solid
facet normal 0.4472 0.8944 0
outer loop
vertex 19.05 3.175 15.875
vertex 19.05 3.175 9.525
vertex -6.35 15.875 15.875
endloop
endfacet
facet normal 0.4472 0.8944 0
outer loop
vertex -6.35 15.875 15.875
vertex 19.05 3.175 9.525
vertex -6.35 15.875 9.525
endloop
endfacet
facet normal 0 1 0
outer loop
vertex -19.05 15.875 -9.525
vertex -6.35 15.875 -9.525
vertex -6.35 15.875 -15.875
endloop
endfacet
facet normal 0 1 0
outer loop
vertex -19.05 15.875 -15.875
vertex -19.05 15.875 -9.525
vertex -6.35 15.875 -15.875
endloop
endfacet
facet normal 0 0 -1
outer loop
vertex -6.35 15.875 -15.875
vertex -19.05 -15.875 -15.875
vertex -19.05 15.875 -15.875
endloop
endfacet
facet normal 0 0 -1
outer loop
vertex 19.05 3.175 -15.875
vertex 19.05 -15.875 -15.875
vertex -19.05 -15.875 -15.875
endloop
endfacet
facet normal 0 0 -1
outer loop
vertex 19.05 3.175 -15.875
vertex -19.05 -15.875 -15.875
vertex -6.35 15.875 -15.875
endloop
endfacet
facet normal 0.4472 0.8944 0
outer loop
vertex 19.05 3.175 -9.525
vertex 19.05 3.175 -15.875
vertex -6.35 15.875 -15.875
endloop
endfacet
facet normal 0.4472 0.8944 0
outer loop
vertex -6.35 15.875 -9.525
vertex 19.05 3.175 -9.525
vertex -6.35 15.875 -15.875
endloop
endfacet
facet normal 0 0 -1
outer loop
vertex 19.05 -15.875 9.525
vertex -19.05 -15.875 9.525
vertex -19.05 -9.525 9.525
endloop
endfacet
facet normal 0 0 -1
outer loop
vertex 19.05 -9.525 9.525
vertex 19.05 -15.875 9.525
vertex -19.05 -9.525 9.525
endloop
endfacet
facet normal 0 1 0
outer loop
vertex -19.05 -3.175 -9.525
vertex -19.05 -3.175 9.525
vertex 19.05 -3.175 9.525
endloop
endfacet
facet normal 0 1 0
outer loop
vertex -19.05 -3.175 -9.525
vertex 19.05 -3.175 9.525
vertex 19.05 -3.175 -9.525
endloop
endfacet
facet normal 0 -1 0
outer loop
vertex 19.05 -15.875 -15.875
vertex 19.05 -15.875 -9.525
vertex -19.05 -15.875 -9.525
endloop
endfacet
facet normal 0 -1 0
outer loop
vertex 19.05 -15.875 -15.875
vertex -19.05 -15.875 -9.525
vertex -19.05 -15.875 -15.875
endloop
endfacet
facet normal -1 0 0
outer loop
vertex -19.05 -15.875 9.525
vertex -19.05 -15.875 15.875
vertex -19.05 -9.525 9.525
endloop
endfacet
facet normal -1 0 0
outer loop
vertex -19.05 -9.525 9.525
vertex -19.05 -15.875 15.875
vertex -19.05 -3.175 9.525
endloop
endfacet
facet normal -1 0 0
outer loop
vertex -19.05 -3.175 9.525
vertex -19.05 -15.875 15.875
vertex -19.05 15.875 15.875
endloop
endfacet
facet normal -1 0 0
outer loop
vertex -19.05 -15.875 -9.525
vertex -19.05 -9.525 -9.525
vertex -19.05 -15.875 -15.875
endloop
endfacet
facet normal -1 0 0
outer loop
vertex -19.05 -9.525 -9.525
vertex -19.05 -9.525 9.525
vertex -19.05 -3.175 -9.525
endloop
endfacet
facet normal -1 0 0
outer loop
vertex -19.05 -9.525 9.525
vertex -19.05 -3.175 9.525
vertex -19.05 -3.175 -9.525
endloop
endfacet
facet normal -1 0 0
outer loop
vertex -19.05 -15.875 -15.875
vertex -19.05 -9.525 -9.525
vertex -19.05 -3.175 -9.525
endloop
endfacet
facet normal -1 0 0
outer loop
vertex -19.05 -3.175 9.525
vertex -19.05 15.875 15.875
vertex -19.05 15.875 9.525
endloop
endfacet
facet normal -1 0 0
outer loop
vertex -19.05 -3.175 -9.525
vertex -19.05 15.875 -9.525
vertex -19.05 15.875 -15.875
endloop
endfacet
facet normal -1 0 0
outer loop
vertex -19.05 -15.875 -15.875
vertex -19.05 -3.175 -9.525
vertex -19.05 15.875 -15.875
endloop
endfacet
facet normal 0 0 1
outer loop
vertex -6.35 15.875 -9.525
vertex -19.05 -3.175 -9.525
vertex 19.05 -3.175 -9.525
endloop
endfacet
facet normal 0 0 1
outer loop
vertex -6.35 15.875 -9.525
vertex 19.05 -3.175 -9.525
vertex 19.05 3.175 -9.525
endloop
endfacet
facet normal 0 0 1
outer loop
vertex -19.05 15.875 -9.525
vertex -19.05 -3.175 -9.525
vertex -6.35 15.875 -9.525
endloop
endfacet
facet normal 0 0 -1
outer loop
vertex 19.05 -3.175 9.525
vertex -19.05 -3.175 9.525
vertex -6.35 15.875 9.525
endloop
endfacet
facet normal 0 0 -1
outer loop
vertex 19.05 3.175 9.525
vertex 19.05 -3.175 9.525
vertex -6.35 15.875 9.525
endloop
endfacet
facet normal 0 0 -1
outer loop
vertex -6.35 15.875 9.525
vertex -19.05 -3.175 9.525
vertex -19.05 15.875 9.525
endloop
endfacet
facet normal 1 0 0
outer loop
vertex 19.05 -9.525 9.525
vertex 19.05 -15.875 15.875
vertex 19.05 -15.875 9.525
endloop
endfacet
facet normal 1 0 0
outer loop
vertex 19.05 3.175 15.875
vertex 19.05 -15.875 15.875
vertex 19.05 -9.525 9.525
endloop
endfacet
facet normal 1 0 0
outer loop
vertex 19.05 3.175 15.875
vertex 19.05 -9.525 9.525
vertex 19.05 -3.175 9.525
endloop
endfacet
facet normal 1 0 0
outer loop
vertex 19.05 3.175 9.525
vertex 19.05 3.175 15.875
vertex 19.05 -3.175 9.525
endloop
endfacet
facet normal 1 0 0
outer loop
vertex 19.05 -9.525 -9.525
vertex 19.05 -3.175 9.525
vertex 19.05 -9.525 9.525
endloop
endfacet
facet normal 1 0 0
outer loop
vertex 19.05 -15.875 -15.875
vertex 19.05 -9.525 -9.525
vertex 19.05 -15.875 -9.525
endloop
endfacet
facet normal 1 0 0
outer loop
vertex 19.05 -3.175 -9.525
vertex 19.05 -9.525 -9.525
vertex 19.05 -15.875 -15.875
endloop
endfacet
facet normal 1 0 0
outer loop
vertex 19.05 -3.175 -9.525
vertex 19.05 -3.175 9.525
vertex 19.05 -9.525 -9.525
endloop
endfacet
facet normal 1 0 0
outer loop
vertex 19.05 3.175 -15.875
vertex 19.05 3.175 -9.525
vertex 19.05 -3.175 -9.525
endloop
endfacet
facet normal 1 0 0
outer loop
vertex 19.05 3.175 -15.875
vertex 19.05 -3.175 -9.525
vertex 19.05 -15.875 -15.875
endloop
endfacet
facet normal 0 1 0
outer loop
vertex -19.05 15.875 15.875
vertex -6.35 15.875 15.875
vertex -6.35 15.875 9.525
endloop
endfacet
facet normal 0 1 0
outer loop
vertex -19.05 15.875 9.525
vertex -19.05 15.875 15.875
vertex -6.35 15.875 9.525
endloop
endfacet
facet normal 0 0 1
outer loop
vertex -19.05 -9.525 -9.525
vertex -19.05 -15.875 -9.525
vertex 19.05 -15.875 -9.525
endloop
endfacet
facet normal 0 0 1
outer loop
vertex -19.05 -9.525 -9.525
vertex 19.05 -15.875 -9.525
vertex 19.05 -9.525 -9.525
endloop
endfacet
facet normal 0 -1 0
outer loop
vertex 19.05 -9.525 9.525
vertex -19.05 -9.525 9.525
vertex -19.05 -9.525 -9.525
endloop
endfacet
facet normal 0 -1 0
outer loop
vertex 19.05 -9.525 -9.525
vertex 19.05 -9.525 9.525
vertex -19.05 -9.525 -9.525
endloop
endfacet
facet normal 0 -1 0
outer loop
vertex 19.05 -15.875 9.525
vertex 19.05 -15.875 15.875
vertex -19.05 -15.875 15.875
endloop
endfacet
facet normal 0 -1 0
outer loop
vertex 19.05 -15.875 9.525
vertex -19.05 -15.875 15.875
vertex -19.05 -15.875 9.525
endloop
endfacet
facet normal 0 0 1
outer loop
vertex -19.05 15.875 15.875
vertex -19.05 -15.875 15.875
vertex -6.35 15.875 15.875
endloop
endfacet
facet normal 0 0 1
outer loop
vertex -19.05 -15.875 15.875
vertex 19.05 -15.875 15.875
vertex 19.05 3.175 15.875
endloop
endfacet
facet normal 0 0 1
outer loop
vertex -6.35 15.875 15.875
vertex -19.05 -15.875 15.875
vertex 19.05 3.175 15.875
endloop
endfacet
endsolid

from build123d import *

# Parameters (mm, degrees)
SKETCH2_W               = 31.75
SKETCH2_H               = 31.75
BOSS_EXTRUDE2_DEPTH     = 19.05
CUT_EXTRUDE1_DEPTH      = 30.443738723
CUT_EXTRUDE1_DEPTH_BACK = 30.443738723
SKETCH4_W               = 19.05
SKETCH4_H               = 19.05
CUT_EXTRUDE2_DEPTH      = 30.443738723
CUT_EXTRUDE2_DEPTH_BACK = 30.443738723
SKETCH5_W               = 19.05
SKETCH5_H               = 6.35
CUT_EXTRUDE3_DEPTH      = 30.443738723
CUT_EXTRUDE3_DEPTH_BACK = 30.443738723


with BuildPart() as part:
    # Sketch2 → Boss-Extrude2 (new, symmetric)
    with BuildSketch(Plane(origin=(0, 0, 0), x_dir=(0, 0, -1), z_dir=(1, 0, 0))):
        Rectangle(SKETCH2_W, SKETCH2_H)
    extrude(amount=BOSS_EXTRUDE2_DEPTH, both=True)

    # Sketch4 → Cut-Extrude1 (cut, two sides: drawn at the far end of the back side and taken through both)
    with BuildSketch(Plane(origin=(0, 0, 0), x_dir=(0, 0, -1), z_dir=(1, 0, 0)).offset(-CUT_EXTRUDE1_DEPTH_BACK)):
        with Locations((0, 6.35)):
            Rectangle(SKETCH4_W, SKETCH4_H)
    extrude(amount=CUT_EXTRUDE1_DEPTH + CUT_EXTRUDE1_DEPTH_BACK, mode=Mode.SUBTRACT)

    # Sketch5 → Cut-Extrude2 (cut, two sides: drawn at the far end of the back side and taken through both)
    with BuildSketch(Plane(origin=(0, 0, 0), x_dir=(0, 0, -1), z_dir=(1, 0, 0)).offset(-CUT_EXTRUDE2_DEPTH_BACK)):
        with Locations((0, -12.7)):
            Rectangle(SKETCH5_W, SKETCH5_H)
    extrude(amount=CUT_EXTRUDE2_DEPTH + CUT_EXTRUDE2_DEPTH_BACK, mode=Mode.SUBTRACT)

    # Sketch6 → Cut-Extrude3 (cut, two sides: drawn at the far end of the back side and taken through both)
    with BuildSketch(Plane.XY.offset(-CUT_EXTRUDE3_DEPTH_BACK)):
        Polygon((19.05, 15.875), (19.05, 3.175), (-6.35, 15.875), align=None)
    extrude(amount=CUT_EXTRUDE3_DEPTH + CUT_EXTRUDE3_DEPTH_BACK, mode=Mode.SUBTRACT)


solid = part.part
